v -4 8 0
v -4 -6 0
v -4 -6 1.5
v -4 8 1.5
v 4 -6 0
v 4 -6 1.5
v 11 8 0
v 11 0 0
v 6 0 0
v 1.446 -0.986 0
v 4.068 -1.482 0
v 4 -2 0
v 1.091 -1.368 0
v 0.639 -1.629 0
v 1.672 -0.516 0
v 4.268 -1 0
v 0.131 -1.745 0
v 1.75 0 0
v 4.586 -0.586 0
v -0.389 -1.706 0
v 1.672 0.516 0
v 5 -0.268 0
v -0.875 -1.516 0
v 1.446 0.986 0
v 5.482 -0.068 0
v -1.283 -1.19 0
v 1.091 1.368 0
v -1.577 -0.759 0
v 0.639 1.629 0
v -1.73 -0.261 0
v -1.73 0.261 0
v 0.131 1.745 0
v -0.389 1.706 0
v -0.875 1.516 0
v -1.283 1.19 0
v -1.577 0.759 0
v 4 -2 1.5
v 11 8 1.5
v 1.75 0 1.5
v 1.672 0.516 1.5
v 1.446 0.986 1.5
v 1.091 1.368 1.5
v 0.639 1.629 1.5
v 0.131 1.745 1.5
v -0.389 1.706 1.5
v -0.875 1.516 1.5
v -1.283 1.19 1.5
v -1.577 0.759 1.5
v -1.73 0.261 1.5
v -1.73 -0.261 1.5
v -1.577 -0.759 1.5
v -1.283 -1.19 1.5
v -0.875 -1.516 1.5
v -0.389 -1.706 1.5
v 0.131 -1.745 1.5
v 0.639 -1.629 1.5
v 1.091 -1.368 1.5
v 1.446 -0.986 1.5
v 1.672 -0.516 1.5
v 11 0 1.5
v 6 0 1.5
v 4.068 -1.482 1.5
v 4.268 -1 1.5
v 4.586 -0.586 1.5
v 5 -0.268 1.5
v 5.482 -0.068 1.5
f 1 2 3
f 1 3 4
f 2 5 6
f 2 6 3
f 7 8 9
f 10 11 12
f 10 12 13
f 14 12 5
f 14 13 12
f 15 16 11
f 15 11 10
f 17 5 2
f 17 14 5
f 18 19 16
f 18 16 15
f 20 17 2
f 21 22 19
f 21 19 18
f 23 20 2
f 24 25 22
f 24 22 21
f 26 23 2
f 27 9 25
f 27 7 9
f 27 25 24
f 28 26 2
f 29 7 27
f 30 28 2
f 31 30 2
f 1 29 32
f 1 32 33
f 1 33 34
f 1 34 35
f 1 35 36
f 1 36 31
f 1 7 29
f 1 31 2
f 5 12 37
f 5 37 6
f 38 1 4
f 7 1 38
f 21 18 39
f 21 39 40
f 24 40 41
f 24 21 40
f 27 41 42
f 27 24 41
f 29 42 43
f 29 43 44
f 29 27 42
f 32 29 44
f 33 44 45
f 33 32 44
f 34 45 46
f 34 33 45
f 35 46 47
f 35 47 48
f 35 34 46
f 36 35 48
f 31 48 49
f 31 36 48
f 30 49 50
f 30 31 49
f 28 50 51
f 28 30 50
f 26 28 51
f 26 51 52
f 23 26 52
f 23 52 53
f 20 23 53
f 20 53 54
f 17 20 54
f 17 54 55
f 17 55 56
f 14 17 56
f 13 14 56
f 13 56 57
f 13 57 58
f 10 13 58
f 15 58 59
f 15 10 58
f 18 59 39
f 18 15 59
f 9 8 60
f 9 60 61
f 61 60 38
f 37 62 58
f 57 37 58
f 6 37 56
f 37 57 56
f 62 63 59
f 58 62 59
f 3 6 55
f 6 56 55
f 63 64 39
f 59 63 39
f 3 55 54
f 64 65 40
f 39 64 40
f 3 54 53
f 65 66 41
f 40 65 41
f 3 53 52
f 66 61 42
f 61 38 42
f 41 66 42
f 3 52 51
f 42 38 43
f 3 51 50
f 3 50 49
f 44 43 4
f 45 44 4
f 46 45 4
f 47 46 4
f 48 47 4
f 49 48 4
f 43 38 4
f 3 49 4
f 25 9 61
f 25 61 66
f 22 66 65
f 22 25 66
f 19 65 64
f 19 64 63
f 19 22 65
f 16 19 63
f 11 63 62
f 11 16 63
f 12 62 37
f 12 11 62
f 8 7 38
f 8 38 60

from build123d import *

# Parameters (mm, degrees)
SKETCH1_R           = 1.75
BOSS_EXTRUDE1_DEPTH = 1.5


with BuildPart() as part:
    # Sketch1 → Boss-Extrude1 (new body)
    with BuildSketch(Plane.XY):
        with BuildLine():
            Line((4, -6), (-4, -6))
            Line((-4, -6), (-4, 8))
            Line((-4, 8), (11, 8))
            Line((11, 8), (11, 0))
            Line((11, 0), (6, 0))
            ThreePointArc((6, 0), (4.585786438, -0.585786438), (4, -2))
            Line((4, -2), (4, -6))
        make_face()
        Circle(SKETCH1_R, mode=Mode.SUBTRACT)
    extrude(amount=BOSS_EXTRUDE1_DEPTH)


solid = part.part
